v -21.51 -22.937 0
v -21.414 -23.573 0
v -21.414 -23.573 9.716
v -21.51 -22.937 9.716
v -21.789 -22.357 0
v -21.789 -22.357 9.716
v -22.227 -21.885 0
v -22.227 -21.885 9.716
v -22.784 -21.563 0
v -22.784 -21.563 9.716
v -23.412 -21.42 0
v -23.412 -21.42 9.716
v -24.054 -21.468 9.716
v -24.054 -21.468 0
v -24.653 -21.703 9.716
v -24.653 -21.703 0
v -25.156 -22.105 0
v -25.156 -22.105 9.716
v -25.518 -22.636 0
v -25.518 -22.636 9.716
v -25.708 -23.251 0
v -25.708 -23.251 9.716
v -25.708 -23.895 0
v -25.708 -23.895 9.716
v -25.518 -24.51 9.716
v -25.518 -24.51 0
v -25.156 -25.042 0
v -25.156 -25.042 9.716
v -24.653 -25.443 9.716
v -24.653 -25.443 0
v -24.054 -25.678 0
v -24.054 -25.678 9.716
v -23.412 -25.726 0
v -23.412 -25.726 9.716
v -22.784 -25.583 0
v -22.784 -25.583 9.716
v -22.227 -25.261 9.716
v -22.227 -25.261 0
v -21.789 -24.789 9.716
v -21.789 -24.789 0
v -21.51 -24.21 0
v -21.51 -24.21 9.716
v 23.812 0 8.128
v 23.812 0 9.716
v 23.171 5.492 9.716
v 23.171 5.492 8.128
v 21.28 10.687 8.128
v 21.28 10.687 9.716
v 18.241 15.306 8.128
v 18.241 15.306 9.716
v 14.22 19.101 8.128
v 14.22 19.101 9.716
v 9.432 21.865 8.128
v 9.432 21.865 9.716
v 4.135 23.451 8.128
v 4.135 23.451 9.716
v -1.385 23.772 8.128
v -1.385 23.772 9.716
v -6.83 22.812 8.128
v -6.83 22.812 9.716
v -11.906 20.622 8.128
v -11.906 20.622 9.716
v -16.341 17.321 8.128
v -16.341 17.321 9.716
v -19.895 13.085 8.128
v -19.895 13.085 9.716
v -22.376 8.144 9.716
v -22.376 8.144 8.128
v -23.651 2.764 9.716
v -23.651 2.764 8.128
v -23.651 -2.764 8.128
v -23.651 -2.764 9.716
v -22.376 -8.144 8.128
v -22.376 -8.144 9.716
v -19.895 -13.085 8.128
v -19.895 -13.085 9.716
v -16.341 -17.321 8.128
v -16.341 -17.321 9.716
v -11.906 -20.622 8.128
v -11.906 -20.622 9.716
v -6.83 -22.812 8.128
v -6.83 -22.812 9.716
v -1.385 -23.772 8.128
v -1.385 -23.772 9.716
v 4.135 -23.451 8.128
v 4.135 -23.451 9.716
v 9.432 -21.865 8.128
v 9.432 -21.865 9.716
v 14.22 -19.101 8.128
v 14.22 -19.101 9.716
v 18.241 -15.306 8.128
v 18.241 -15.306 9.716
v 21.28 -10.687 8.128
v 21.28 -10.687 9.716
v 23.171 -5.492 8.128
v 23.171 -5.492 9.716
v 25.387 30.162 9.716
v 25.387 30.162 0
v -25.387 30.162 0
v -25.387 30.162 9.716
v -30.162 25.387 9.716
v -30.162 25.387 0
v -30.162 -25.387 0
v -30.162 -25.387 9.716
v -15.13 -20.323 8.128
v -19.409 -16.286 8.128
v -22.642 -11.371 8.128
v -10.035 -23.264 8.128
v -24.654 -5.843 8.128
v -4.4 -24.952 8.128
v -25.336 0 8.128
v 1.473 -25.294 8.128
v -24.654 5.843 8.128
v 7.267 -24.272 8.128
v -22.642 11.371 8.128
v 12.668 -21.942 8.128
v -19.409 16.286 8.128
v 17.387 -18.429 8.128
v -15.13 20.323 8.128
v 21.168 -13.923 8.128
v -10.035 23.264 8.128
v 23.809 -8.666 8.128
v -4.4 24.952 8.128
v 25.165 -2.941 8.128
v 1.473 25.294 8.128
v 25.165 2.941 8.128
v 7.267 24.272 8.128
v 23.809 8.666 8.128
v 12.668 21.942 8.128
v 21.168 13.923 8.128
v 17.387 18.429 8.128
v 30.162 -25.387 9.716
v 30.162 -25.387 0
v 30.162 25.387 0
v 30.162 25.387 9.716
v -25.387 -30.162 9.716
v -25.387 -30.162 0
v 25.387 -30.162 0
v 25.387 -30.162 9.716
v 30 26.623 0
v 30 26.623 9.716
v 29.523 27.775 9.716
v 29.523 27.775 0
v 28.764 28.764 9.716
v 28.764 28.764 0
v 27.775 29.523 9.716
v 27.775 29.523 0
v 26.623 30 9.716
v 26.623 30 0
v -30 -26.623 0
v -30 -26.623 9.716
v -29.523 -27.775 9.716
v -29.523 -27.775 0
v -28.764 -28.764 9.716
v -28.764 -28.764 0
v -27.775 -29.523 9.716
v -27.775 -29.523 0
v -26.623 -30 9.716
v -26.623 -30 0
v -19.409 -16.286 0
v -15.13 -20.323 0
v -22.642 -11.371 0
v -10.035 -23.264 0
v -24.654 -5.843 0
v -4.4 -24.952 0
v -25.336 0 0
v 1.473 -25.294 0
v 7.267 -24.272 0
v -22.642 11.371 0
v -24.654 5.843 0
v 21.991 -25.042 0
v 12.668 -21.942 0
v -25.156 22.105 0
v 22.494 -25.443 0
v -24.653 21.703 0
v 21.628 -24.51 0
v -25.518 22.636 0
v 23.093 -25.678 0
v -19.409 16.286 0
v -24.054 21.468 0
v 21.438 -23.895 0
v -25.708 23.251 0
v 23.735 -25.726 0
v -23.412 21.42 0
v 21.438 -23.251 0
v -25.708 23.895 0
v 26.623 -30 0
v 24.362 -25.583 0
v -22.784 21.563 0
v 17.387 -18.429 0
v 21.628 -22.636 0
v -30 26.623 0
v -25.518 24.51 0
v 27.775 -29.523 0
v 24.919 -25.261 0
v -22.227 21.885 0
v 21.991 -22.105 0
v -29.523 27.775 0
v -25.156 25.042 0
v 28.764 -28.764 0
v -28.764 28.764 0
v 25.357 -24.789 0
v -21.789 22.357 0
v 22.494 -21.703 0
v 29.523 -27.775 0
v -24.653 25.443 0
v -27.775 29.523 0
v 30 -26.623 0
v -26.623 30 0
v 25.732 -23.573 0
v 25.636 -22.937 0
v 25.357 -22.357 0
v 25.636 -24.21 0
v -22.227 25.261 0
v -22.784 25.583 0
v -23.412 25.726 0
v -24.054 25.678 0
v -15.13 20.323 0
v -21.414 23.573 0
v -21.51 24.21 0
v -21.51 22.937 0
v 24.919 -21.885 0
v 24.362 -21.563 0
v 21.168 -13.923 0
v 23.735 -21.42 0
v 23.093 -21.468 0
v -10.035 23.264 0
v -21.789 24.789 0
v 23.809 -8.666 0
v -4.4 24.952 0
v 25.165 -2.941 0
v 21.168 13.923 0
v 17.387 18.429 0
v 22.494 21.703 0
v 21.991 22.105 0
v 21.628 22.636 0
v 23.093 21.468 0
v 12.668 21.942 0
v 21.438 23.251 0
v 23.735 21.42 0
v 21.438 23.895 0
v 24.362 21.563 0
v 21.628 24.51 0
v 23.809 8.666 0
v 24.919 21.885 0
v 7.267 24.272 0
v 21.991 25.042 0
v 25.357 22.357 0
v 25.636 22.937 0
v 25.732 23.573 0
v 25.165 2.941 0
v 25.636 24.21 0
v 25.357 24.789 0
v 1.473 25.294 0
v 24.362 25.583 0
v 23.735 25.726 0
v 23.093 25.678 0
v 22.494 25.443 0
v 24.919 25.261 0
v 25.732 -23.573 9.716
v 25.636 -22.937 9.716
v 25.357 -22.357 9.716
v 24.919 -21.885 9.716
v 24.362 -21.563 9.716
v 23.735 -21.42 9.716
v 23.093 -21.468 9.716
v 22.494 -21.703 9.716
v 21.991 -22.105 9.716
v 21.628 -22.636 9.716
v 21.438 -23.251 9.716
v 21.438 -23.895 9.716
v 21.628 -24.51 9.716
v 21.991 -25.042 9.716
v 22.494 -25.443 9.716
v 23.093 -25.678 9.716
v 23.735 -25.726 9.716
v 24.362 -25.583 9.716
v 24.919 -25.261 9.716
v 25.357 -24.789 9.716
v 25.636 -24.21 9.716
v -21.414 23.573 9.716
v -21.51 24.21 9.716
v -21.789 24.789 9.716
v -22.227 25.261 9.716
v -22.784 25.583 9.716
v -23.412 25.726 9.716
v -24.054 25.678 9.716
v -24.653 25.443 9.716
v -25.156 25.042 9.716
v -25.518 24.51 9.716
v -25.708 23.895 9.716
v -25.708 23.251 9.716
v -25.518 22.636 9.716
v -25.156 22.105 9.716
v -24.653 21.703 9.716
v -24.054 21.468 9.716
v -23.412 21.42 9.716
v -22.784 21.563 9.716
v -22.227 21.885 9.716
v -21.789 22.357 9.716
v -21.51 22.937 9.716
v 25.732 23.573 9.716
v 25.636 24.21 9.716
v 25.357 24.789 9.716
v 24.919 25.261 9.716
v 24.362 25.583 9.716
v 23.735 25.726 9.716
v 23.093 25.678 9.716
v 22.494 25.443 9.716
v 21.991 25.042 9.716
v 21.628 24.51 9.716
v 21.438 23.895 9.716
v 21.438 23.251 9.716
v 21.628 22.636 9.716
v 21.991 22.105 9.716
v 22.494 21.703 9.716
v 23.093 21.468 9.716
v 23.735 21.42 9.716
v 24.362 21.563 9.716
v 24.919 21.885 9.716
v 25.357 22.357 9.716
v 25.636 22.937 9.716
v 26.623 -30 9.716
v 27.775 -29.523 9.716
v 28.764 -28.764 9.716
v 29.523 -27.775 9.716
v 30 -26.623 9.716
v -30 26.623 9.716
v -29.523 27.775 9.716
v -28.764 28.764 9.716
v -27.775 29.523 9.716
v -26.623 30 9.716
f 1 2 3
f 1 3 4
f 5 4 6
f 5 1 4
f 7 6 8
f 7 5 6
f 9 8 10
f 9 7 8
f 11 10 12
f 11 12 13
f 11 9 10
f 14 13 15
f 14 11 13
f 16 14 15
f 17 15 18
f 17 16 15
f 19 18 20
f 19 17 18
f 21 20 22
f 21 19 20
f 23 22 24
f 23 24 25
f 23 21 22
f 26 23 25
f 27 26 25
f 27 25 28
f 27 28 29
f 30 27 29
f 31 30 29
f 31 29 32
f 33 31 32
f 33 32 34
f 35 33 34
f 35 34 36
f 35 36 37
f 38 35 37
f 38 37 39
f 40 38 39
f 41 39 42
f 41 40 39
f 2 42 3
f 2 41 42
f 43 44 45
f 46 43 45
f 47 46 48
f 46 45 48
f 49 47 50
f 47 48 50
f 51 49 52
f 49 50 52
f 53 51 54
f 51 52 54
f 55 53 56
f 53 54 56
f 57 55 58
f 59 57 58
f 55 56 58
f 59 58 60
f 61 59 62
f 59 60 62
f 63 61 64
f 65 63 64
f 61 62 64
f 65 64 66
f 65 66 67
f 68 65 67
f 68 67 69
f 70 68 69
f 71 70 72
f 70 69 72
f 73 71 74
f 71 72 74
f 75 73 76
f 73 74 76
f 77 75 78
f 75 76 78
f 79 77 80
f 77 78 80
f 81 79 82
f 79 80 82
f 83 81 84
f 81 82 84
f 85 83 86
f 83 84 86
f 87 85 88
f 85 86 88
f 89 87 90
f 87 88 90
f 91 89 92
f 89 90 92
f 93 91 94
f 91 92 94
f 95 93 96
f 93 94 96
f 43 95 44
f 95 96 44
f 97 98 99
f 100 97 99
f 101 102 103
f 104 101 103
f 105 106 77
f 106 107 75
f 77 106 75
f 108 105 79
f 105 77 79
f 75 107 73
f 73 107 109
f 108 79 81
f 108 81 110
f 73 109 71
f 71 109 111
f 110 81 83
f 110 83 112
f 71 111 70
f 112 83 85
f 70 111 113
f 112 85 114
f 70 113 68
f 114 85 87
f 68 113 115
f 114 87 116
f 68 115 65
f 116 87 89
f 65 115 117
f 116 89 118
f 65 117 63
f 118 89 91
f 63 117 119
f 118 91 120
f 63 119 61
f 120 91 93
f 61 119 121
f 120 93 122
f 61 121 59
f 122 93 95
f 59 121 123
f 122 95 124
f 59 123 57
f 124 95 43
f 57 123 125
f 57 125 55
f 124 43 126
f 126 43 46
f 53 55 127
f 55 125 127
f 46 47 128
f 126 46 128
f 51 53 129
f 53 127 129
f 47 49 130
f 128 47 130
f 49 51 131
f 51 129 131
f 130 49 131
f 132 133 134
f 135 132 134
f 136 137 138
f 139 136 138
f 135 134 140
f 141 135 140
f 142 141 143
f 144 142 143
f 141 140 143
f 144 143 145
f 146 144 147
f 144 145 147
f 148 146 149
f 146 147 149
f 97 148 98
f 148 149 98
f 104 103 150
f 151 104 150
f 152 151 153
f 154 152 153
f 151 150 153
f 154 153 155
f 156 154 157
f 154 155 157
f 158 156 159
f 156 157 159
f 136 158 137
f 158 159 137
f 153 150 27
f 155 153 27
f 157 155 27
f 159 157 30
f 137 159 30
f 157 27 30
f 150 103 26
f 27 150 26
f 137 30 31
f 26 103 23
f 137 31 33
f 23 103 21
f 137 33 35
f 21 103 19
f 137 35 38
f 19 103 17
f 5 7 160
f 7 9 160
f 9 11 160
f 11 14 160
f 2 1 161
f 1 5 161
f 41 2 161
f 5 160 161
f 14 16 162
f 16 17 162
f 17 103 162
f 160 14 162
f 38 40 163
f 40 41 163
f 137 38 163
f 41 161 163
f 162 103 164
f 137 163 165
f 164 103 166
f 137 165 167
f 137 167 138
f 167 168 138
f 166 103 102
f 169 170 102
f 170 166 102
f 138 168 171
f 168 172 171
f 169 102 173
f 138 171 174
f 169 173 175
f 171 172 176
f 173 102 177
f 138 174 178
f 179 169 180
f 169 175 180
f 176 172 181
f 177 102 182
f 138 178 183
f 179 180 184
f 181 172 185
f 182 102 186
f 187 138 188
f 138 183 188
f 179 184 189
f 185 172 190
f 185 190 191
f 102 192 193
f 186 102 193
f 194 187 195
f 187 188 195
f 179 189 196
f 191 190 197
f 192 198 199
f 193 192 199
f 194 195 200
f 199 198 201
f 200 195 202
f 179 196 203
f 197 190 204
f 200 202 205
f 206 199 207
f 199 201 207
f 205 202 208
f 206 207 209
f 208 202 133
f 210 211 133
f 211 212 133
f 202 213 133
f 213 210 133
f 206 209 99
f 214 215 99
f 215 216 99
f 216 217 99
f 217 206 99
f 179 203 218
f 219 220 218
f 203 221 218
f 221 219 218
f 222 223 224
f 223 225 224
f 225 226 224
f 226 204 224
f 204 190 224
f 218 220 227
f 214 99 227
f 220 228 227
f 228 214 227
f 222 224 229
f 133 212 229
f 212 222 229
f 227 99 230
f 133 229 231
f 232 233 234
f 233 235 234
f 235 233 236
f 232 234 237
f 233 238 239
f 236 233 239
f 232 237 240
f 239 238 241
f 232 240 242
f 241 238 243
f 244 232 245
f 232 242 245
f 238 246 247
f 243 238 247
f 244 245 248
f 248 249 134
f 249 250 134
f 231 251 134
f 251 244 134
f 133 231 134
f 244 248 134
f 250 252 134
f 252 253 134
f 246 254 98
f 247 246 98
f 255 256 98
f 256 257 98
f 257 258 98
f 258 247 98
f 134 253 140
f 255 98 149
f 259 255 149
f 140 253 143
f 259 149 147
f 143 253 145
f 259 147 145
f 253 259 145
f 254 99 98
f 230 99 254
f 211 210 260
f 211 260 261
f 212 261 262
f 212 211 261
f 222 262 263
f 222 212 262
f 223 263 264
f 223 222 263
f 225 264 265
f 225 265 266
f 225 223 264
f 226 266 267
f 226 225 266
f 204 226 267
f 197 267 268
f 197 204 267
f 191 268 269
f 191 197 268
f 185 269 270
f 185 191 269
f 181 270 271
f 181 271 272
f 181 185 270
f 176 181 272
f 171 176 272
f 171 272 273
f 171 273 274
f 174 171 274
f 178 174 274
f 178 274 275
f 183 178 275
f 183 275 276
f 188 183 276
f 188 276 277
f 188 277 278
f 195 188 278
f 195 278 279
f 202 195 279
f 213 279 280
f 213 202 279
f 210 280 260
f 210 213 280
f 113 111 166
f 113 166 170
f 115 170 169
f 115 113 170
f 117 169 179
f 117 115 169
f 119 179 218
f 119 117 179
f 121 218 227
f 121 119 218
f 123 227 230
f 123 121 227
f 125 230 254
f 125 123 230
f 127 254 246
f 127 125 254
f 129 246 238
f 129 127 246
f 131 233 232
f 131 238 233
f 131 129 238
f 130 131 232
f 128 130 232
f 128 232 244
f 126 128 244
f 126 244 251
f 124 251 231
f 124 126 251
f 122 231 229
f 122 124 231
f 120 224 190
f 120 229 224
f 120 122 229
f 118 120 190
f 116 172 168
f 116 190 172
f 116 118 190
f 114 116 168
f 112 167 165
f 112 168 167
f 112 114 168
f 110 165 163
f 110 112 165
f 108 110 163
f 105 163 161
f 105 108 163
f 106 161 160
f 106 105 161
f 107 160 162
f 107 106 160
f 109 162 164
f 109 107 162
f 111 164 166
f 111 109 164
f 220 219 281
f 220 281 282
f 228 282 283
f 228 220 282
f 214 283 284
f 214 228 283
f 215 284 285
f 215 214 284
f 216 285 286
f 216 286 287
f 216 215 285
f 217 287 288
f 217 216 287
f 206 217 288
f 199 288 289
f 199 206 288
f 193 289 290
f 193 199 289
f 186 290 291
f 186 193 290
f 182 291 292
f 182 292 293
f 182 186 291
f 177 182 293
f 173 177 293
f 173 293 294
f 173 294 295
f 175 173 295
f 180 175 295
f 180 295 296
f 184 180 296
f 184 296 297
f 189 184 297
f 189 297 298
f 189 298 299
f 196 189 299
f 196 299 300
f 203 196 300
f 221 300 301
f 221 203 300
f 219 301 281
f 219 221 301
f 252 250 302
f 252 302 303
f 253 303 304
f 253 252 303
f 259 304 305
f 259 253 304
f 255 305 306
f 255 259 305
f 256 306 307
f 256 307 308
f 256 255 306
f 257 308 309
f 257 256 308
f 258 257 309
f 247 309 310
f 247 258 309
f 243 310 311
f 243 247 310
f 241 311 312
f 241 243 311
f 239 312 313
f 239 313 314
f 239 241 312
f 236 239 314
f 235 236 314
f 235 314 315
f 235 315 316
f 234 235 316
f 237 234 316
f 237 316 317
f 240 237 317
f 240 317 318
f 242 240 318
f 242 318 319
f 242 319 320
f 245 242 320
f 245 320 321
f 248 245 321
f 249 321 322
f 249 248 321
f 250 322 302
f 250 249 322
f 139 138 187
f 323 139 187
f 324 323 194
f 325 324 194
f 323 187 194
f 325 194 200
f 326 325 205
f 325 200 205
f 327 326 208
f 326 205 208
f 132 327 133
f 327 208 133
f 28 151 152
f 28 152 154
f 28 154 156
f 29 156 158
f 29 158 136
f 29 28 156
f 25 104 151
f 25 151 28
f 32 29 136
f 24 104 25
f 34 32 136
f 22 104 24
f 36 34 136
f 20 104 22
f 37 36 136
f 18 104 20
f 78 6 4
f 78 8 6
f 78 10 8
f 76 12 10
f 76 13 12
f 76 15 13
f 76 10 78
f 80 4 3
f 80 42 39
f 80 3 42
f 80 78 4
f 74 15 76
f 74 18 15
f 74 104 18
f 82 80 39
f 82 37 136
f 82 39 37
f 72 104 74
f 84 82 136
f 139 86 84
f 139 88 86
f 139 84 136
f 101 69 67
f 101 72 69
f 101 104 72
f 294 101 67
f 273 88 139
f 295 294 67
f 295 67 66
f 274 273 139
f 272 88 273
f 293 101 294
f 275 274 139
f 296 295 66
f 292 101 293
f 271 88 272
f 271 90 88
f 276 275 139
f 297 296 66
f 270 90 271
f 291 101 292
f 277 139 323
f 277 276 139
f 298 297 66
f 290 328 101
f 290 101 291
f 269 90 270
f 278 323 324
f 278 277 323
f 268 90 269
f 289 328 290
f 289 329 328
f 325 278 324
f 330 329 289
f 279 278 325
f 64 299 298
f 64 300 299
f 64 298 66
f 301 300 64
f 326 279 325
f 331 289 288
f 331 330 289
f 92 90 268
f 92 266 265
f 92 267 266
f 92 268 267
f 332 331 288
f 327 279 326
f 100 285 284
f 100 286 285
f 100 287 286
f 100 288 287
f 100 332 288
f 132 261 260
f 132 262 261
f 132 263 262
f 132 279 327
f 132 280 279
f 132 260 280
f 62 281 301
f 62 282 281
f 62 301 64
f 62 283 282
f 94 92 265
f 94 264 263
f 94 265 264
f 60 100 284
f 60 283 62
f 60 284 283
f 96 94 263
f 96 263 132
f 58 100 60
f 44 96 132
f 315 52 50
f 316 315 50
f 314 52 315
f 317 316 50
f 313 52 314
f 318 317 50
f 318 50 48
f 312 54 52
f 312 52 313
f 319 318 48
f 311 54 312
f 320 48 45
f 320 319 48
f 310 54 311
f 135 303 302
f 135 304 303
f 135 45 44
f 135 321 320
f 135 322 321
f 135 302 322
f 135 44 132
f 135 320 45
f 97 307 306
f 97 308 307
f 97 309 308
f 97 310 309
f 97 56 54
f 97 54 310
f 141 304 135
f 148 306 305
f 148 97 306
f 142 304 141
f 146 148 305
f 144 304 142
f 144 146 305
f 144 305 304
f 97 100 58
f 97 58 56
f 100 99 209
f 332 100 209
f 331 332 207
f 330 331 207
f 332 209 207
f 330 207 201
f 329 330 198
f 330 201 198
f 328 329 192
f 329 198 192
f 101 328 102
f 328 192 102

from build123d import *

# Parameters (mm, degrees)
SKETCH1_R               = 2.159
SKETCH1_R_2             = 28.5115
BOSS_EXTRUDE1_DEPTH     = 9.7155
SKETCH1_4_R             = 28.5115
SKETCH1_4_R_2           = 23.8125
FLUSH_BEZEL_DEPTH       = 9.7155
SKETCH1_5_R             = 28.5115
SKETCH1_5_R_2           = 23.8125
BOSS_EXTRUDE4_DEPTH     = 6.35
SKETCH2_R               = 25.3365
CUT_EXTRUDE1_DEPTH      = 7.35
CUT_EXTRUDE1_DEPTH_BACK = 9.7155
SKETCH3_R               = 28.5115
CUT_EXTRUDE2_DEPTH      = 7.35
SKETCH4_R               = 25.3365
SKETCH4_R_2             = 23.8125
BOSS_EXTRUDE7_DEPTH     = 1.5875


with BuildPart() as part:
    # Sketch1 → Boss-Extrude1 (new body)
    with BuildSketch(Plane.XY):
        with BuildLine():
            ThreePointArc((-24.49722379, -28.024879905), (-26.788104009, -26.788104009), (-28.024879905, -24.49722379))
            Line((-28.024879905, -24.49722379), (-30.1625, -14.199031657))
            Line((-30.1625, -14.199031657), (-30.1625, 14.199031657))
            Line((-30.1625, 14.199031657), (-28.024879905, 24.49722379))
            ThreePointArc((-28.024879905, 24.49722379), (-26.788104009, 26.788104009), (-24.49722379, 28.024879905))
            Line((-24.49722379, 28.024879905), (-14.199031657, 30.1625))
            Line((-14.199031657, 30.1625), (14.199031657, 30.1625))
            Line((14.199031657, 30.1625), (24.441349319, 28.268787691))
            ThreePointArc((24.441349319, 28.268787691), (26.949748619, 26.949748619), (28.268787691, 24.441349319))
            Line((28.268787691, 24.441349319), (30.1625, 14.199031657))
            Line((30.1625, 14.199031657), (30.1625, -14.199031657))
            Line((30.1625, -14.199031657), (28.024879905, -24.49722379))
            ThreePointArc((28.024879905, -24.49722379), (26.788104009, -26.788104009), (24.49722379, -28.024879905))
            Line((24.49722379, -28.024879905), (14.199031657, -30.1625))
            Line((14.199031657, -30.1625), (-14.199031657, -30.1625))
            Line((-14.199031657, -30.1625), (-24.49722379, -28.024879905))
        make_face()
        with Locations((-23.573172318, -23.573172318)):
            Circle(SKETCH1_R, mode=Mode.SUBTRACT)
        with Locations((23.573172318, -23.573172318)):
            Circle(SKETCH1_R, mode=Mode.SUBTRACT)
        with Locations((23.573172318, 23.573172318)):
            Circle(SKETCH1_R, mode=Mode.SUBTRACT)
        with Locations((-23.573172318, 23.573172318)):
            Circle(SKETCH1_R, mode=Mode.SUBTRACT)
        Circle(SKETCH1_R_2, mode=Mode.SUBTRACT)
        with BuildLine():
            Line((28.268787691, 24.441349319), (30.1625, 14.199031657))
            Line((30.1625, 14.199031657), (30.1625, 25.3873))
            ThreePointArc((30.1625, 25.3873), (28.763876302, 28.763876302), (25.3873, 30.1625))
            Line((25.3873, 30.1625), (14.199031657, 30.1625))
            Line((14.199031657, 30.1625), (24.441349319, 28.268787691))
            ThreePointArc((24.441349319, 28.268787691), (26.949748619, 26.949748619), (28.268787691, 24.441349319))
        make_face()
        with BuildLine():
            Line((-30.1625, 25.3873), (-30.1625, 14.199031657))
            Line((-30.1625, 14.199031657), (-28.024879905, 24.49722379))
            ThreePointArc((-28.024879905, 24.49722379), (-26.788104009, 26.788104009), (-24.49722379, 28.024879905))
            Line((-24.49722379, 28.024879905), (-14.199031657, 30.1625))
            Line((-14.199031657, 30.1625), (-25.3873, 30.1625))
            ThreePointArc((-25.3873, 30.1625), (-28.763876302, 28.763876302), (-30.1625, 25.3873))
        make_face()
        with BuildLine():
            Line((-25.3873, -30.1625), (-14.199031657, -30.1625))
            Line((-14.199031657, -30.1625), (-24.49722379, -28.024879905))
            ThreePointArc((-24.49722379, -28.024879905), (-26.788104009, -26.788104009), (-28.024879905, -24.49722379))
            Line((-28.024879905, -24.49722379), (-30.1625, -14.199031657))
            Line((-30.1625, -14.199031657), (-30.1625, -25.3873))
            ThreePointArc((-30.1625, -25.3873), (-28.763876302, -28.763876302), (-25.3873, -30.1625))
        make_face()
        with BuildLine():
            Line((24.49722379, -28.024879905), (14.199031657, -30.1625))
            Line((14.199031657, -30.1625), (25.3873, -30.1625))
            ThreePointArc((25.3873, -30.1625), (28.763876302, -28.763876302), (30.1625, -25.3873))
            Line((30.1625, -25.3873), (30.1625, -14.199031657))
            Line((30.1625, -14.199031657), (28.024879905, -24.49722379))
            ThreePointArc((28.024879905, -24.49722379), (26.788104009, -26.788104009), (24.49722379, -28.024879905))
        make_face()
    extrude(amount=BOSS_EXTRUDE1_DEPTH)

    # Sketch1_4 → Flush Bezel (add)
    with BuildSketch(Plane.XY):
        Circle(SKETCH1_4_R)
        Circle(SKETCH1_4_R_2, mode=Mode.SUBTRACT)
    extrude(amount=FLUSH_BEZEL_DEPTH)

    # Sketch1_5 → Boss-Extrude4 (add)
    with BuildSketch(Plane.XY):
        Circle(SKETCH1_5_R)
        Circle(SKETCH1_5_R_2, mode=Mode.SUBTRACT)
    extrude(amount=-BOSS_EXTRUDE4_DEPTH)

    # Sketch2 → Cut-Extrude1 (cut, two sides)
    with BuildSketch(Plane(origin=(0, 0, 0), x_dir=(-1, 0, 0), z_dir=(0, 0, -1))) as cut_extrude1_sk:
        Circle(SKETCH2_R)
    extrude(amount=CUT_EXTRUDE1_DEPTH, mode=Mode.SUBTRACT)
    extrude(cut_extrude1_sk.sketch, amount=-CUT_EXTRUDE1_DEPTH_BACK, mode=Mode.SUBTRACT)

    # Sketch3 → Cut-Extrude2 (cut, through all)
    with BuildSketch(Plane(origin=(0, 0, 0), x_dir=(-1, 0, 0), z_dir=(0, 0, -1))):
        Circle(SKETCH3_R)
    extrude(amount=CUT_EXTRUDE2_DEPTH, mode=Mode.SUBTRACT)

    # Sketch4 → Boss-Extrude7 (add)
    with BuildSketch(Plane.XY.offset(9.7155)):
        Circle(SKETCH4_R)
        Circle(SKETCH4_R_2, mode=Mode.SUBTRACT)
    extrude(amount=-BOSS_EXTRUDE7_DEPTH)


solid = part.part
